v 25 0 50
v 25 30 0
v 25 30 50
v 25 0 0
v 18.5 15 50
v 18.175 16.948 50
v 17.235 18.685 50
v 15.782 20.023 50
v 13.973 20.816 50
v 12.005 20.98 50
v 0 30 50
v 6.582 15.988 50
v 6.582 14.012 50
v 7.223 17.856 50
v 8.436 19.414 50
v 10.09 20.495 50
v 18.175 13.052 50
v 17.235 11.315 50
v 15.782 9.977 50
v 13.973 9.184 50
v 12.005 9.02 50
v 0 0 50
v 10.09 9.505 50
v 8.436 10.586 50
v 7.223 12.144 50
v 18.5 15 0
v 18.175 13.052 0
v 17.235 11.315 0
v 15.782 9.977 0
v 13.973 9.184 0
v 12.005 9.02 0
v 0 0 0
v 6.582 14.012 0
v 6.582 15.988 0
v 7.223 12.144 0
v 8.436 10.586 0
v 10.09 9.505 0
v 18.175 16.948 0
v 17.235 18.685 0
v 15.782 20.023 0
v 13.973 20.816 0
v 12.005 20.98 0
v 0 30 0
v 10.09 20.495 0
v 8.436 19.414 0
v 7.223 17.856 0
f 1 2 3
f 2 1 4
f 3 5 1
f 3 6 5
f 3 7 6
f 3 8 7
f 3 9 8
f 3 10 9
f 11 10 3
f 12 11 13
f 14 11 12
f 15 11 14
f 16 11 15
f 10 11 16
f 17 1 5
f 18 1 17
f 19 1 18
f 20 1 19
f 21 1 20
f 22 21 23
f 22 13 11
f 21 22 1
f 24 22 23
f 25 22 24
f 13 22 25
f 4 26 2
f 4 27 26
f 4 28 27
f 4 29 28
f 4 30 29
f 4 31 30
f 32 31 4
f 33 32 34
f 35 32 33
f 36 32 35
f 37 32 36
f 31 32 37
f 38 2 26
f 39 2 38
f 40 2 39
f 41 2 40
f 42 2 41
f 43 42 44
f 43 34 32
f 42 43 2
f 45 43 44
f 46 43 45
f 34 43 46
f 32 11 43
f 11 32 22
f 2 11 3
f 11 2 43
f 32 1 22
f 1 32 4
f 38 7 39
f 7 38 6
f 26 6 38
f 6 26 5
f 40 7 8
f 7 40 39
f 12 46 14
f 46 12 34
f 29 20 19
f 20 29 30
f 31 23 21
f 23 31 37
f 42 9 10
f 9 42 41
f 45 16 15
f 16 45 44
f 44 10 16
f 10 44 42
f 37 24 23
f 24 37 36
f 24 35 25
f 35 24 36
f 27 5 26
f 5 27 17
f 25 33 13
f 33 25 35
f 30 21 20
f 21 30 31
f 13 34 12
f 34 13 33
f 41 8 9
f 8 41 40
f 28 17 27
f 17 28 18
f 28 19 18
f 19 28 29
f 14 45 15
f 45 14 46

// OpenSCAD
// Qwen smoke baseline: a 25×30×50 mm block with a 12 mm through-hole.
// The operator has confirmed the model works in practice — this case is
// the reference every future model is measured against (not a gate).
W = 25;
D = 30;
H = 50;
HOLE_D = 12;

module block() {
  cube([W, D, H]);
}

module hole() {
  translate([W / 2, D / 2, 0])
  cylinder(h=H, d=HOLE_D);
}

difference() {
  block();
  hole();
}
